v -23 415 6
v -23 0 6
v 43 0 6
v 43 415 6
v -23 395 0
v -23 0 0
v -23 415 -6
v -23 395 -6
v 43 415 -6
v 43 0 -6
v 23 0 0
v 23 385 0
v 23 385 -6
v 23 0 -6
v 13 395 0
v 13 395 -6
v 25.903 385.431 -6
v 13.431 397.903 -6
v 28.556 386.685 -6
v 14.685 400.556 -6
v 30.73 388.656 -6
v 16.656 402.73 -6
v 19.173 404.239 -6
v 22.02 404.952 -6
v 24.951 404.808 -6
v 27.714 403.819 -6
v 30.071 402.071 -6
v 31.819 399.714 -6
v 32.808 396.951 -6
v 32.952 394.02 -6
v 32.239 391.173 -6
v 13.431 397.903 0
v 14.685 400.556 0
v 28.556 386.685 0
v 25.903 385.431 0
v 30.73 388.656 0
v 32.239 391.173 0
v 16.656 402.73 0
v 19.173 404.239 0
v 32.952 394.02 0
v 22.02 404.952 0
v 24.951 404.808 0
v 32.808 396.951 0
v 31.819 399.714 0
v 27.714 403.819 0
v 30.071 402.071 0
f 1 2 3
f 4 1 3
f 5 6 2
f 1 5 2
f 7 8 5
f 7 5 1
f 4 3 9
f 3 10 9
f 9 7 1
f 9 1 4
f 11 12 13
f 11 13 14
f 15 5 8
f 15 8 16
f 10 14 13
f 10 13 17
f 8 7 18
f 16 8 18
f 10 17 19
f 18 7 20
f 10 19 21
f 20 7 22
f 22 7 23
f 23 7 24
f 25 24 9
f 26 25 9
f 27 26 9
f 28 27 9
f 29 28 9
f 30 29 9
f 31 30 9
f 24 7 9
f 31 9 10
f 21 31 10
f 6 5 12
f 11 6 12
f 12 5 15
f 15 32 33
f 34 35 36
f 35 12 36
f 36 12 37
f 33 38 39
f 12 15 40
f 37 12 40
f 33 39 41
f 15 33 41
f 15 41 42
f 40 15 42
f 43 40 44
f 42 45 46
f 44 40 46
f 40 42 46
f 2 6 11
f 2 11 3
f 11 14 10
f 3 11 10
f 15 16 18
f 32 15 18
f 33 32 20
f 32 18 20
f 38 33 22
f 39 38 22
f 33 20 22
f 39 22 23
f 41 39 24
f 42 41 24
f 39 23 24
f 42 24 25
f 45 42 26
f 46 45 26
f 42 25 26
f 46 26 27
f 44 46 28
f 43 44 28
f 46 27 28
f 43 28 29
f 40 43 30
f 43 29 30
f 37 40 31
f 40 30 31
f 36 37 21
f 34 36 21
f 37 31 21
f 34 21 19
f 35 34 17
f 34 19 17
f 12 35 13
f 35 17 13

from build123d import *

# Parameters (mm, degrees)
BOSS_EXTRUDE1_DEPTH = 6
SKETCH2_W           = 66
SKETCH2_H           = 415
BOSS_EXTRUDE2_DEPTH = 6
SKETCH3_R           = 10
CUT_EXTRUDE1_DEPTH  = 6


with BuildPart() as part:
    # Sketch1 → Boss-Extrude1 (new body)
    with BuildSketch(Plane.XY):
        Polygon((23, 395), (23, 0), (43, 0), (43, 415), (-23, 415), (-23, 395), align=None)
    extrude(amount=-BOSS_EXTRUDE1_DEPTH)

    # Sketch2 → Boss-Extrude2 (add)
    with BuildSketch(Plane.XY):
        with Locations((10, 207.5)):
            Rectangle(SKETCH2_W, SKETCH2_H)
    extrude(amount=BOSS_EXTRUDE2_DEPTH)

    # Sketch3 → Cut-Extrude1 (cut)
    with BuildSketch(Plane(origin=(0, 0, -6), x_dir=(-1, 0, 0), z_dir=(0, 0, -1))):
        with Locations((-23, 395)):
            Circle(SKETCH3_R)
    extrude(amount=-CUT_EXTRUDE1_DEPTH, mode=Mode.SUBTRACT)


solid = part.part
